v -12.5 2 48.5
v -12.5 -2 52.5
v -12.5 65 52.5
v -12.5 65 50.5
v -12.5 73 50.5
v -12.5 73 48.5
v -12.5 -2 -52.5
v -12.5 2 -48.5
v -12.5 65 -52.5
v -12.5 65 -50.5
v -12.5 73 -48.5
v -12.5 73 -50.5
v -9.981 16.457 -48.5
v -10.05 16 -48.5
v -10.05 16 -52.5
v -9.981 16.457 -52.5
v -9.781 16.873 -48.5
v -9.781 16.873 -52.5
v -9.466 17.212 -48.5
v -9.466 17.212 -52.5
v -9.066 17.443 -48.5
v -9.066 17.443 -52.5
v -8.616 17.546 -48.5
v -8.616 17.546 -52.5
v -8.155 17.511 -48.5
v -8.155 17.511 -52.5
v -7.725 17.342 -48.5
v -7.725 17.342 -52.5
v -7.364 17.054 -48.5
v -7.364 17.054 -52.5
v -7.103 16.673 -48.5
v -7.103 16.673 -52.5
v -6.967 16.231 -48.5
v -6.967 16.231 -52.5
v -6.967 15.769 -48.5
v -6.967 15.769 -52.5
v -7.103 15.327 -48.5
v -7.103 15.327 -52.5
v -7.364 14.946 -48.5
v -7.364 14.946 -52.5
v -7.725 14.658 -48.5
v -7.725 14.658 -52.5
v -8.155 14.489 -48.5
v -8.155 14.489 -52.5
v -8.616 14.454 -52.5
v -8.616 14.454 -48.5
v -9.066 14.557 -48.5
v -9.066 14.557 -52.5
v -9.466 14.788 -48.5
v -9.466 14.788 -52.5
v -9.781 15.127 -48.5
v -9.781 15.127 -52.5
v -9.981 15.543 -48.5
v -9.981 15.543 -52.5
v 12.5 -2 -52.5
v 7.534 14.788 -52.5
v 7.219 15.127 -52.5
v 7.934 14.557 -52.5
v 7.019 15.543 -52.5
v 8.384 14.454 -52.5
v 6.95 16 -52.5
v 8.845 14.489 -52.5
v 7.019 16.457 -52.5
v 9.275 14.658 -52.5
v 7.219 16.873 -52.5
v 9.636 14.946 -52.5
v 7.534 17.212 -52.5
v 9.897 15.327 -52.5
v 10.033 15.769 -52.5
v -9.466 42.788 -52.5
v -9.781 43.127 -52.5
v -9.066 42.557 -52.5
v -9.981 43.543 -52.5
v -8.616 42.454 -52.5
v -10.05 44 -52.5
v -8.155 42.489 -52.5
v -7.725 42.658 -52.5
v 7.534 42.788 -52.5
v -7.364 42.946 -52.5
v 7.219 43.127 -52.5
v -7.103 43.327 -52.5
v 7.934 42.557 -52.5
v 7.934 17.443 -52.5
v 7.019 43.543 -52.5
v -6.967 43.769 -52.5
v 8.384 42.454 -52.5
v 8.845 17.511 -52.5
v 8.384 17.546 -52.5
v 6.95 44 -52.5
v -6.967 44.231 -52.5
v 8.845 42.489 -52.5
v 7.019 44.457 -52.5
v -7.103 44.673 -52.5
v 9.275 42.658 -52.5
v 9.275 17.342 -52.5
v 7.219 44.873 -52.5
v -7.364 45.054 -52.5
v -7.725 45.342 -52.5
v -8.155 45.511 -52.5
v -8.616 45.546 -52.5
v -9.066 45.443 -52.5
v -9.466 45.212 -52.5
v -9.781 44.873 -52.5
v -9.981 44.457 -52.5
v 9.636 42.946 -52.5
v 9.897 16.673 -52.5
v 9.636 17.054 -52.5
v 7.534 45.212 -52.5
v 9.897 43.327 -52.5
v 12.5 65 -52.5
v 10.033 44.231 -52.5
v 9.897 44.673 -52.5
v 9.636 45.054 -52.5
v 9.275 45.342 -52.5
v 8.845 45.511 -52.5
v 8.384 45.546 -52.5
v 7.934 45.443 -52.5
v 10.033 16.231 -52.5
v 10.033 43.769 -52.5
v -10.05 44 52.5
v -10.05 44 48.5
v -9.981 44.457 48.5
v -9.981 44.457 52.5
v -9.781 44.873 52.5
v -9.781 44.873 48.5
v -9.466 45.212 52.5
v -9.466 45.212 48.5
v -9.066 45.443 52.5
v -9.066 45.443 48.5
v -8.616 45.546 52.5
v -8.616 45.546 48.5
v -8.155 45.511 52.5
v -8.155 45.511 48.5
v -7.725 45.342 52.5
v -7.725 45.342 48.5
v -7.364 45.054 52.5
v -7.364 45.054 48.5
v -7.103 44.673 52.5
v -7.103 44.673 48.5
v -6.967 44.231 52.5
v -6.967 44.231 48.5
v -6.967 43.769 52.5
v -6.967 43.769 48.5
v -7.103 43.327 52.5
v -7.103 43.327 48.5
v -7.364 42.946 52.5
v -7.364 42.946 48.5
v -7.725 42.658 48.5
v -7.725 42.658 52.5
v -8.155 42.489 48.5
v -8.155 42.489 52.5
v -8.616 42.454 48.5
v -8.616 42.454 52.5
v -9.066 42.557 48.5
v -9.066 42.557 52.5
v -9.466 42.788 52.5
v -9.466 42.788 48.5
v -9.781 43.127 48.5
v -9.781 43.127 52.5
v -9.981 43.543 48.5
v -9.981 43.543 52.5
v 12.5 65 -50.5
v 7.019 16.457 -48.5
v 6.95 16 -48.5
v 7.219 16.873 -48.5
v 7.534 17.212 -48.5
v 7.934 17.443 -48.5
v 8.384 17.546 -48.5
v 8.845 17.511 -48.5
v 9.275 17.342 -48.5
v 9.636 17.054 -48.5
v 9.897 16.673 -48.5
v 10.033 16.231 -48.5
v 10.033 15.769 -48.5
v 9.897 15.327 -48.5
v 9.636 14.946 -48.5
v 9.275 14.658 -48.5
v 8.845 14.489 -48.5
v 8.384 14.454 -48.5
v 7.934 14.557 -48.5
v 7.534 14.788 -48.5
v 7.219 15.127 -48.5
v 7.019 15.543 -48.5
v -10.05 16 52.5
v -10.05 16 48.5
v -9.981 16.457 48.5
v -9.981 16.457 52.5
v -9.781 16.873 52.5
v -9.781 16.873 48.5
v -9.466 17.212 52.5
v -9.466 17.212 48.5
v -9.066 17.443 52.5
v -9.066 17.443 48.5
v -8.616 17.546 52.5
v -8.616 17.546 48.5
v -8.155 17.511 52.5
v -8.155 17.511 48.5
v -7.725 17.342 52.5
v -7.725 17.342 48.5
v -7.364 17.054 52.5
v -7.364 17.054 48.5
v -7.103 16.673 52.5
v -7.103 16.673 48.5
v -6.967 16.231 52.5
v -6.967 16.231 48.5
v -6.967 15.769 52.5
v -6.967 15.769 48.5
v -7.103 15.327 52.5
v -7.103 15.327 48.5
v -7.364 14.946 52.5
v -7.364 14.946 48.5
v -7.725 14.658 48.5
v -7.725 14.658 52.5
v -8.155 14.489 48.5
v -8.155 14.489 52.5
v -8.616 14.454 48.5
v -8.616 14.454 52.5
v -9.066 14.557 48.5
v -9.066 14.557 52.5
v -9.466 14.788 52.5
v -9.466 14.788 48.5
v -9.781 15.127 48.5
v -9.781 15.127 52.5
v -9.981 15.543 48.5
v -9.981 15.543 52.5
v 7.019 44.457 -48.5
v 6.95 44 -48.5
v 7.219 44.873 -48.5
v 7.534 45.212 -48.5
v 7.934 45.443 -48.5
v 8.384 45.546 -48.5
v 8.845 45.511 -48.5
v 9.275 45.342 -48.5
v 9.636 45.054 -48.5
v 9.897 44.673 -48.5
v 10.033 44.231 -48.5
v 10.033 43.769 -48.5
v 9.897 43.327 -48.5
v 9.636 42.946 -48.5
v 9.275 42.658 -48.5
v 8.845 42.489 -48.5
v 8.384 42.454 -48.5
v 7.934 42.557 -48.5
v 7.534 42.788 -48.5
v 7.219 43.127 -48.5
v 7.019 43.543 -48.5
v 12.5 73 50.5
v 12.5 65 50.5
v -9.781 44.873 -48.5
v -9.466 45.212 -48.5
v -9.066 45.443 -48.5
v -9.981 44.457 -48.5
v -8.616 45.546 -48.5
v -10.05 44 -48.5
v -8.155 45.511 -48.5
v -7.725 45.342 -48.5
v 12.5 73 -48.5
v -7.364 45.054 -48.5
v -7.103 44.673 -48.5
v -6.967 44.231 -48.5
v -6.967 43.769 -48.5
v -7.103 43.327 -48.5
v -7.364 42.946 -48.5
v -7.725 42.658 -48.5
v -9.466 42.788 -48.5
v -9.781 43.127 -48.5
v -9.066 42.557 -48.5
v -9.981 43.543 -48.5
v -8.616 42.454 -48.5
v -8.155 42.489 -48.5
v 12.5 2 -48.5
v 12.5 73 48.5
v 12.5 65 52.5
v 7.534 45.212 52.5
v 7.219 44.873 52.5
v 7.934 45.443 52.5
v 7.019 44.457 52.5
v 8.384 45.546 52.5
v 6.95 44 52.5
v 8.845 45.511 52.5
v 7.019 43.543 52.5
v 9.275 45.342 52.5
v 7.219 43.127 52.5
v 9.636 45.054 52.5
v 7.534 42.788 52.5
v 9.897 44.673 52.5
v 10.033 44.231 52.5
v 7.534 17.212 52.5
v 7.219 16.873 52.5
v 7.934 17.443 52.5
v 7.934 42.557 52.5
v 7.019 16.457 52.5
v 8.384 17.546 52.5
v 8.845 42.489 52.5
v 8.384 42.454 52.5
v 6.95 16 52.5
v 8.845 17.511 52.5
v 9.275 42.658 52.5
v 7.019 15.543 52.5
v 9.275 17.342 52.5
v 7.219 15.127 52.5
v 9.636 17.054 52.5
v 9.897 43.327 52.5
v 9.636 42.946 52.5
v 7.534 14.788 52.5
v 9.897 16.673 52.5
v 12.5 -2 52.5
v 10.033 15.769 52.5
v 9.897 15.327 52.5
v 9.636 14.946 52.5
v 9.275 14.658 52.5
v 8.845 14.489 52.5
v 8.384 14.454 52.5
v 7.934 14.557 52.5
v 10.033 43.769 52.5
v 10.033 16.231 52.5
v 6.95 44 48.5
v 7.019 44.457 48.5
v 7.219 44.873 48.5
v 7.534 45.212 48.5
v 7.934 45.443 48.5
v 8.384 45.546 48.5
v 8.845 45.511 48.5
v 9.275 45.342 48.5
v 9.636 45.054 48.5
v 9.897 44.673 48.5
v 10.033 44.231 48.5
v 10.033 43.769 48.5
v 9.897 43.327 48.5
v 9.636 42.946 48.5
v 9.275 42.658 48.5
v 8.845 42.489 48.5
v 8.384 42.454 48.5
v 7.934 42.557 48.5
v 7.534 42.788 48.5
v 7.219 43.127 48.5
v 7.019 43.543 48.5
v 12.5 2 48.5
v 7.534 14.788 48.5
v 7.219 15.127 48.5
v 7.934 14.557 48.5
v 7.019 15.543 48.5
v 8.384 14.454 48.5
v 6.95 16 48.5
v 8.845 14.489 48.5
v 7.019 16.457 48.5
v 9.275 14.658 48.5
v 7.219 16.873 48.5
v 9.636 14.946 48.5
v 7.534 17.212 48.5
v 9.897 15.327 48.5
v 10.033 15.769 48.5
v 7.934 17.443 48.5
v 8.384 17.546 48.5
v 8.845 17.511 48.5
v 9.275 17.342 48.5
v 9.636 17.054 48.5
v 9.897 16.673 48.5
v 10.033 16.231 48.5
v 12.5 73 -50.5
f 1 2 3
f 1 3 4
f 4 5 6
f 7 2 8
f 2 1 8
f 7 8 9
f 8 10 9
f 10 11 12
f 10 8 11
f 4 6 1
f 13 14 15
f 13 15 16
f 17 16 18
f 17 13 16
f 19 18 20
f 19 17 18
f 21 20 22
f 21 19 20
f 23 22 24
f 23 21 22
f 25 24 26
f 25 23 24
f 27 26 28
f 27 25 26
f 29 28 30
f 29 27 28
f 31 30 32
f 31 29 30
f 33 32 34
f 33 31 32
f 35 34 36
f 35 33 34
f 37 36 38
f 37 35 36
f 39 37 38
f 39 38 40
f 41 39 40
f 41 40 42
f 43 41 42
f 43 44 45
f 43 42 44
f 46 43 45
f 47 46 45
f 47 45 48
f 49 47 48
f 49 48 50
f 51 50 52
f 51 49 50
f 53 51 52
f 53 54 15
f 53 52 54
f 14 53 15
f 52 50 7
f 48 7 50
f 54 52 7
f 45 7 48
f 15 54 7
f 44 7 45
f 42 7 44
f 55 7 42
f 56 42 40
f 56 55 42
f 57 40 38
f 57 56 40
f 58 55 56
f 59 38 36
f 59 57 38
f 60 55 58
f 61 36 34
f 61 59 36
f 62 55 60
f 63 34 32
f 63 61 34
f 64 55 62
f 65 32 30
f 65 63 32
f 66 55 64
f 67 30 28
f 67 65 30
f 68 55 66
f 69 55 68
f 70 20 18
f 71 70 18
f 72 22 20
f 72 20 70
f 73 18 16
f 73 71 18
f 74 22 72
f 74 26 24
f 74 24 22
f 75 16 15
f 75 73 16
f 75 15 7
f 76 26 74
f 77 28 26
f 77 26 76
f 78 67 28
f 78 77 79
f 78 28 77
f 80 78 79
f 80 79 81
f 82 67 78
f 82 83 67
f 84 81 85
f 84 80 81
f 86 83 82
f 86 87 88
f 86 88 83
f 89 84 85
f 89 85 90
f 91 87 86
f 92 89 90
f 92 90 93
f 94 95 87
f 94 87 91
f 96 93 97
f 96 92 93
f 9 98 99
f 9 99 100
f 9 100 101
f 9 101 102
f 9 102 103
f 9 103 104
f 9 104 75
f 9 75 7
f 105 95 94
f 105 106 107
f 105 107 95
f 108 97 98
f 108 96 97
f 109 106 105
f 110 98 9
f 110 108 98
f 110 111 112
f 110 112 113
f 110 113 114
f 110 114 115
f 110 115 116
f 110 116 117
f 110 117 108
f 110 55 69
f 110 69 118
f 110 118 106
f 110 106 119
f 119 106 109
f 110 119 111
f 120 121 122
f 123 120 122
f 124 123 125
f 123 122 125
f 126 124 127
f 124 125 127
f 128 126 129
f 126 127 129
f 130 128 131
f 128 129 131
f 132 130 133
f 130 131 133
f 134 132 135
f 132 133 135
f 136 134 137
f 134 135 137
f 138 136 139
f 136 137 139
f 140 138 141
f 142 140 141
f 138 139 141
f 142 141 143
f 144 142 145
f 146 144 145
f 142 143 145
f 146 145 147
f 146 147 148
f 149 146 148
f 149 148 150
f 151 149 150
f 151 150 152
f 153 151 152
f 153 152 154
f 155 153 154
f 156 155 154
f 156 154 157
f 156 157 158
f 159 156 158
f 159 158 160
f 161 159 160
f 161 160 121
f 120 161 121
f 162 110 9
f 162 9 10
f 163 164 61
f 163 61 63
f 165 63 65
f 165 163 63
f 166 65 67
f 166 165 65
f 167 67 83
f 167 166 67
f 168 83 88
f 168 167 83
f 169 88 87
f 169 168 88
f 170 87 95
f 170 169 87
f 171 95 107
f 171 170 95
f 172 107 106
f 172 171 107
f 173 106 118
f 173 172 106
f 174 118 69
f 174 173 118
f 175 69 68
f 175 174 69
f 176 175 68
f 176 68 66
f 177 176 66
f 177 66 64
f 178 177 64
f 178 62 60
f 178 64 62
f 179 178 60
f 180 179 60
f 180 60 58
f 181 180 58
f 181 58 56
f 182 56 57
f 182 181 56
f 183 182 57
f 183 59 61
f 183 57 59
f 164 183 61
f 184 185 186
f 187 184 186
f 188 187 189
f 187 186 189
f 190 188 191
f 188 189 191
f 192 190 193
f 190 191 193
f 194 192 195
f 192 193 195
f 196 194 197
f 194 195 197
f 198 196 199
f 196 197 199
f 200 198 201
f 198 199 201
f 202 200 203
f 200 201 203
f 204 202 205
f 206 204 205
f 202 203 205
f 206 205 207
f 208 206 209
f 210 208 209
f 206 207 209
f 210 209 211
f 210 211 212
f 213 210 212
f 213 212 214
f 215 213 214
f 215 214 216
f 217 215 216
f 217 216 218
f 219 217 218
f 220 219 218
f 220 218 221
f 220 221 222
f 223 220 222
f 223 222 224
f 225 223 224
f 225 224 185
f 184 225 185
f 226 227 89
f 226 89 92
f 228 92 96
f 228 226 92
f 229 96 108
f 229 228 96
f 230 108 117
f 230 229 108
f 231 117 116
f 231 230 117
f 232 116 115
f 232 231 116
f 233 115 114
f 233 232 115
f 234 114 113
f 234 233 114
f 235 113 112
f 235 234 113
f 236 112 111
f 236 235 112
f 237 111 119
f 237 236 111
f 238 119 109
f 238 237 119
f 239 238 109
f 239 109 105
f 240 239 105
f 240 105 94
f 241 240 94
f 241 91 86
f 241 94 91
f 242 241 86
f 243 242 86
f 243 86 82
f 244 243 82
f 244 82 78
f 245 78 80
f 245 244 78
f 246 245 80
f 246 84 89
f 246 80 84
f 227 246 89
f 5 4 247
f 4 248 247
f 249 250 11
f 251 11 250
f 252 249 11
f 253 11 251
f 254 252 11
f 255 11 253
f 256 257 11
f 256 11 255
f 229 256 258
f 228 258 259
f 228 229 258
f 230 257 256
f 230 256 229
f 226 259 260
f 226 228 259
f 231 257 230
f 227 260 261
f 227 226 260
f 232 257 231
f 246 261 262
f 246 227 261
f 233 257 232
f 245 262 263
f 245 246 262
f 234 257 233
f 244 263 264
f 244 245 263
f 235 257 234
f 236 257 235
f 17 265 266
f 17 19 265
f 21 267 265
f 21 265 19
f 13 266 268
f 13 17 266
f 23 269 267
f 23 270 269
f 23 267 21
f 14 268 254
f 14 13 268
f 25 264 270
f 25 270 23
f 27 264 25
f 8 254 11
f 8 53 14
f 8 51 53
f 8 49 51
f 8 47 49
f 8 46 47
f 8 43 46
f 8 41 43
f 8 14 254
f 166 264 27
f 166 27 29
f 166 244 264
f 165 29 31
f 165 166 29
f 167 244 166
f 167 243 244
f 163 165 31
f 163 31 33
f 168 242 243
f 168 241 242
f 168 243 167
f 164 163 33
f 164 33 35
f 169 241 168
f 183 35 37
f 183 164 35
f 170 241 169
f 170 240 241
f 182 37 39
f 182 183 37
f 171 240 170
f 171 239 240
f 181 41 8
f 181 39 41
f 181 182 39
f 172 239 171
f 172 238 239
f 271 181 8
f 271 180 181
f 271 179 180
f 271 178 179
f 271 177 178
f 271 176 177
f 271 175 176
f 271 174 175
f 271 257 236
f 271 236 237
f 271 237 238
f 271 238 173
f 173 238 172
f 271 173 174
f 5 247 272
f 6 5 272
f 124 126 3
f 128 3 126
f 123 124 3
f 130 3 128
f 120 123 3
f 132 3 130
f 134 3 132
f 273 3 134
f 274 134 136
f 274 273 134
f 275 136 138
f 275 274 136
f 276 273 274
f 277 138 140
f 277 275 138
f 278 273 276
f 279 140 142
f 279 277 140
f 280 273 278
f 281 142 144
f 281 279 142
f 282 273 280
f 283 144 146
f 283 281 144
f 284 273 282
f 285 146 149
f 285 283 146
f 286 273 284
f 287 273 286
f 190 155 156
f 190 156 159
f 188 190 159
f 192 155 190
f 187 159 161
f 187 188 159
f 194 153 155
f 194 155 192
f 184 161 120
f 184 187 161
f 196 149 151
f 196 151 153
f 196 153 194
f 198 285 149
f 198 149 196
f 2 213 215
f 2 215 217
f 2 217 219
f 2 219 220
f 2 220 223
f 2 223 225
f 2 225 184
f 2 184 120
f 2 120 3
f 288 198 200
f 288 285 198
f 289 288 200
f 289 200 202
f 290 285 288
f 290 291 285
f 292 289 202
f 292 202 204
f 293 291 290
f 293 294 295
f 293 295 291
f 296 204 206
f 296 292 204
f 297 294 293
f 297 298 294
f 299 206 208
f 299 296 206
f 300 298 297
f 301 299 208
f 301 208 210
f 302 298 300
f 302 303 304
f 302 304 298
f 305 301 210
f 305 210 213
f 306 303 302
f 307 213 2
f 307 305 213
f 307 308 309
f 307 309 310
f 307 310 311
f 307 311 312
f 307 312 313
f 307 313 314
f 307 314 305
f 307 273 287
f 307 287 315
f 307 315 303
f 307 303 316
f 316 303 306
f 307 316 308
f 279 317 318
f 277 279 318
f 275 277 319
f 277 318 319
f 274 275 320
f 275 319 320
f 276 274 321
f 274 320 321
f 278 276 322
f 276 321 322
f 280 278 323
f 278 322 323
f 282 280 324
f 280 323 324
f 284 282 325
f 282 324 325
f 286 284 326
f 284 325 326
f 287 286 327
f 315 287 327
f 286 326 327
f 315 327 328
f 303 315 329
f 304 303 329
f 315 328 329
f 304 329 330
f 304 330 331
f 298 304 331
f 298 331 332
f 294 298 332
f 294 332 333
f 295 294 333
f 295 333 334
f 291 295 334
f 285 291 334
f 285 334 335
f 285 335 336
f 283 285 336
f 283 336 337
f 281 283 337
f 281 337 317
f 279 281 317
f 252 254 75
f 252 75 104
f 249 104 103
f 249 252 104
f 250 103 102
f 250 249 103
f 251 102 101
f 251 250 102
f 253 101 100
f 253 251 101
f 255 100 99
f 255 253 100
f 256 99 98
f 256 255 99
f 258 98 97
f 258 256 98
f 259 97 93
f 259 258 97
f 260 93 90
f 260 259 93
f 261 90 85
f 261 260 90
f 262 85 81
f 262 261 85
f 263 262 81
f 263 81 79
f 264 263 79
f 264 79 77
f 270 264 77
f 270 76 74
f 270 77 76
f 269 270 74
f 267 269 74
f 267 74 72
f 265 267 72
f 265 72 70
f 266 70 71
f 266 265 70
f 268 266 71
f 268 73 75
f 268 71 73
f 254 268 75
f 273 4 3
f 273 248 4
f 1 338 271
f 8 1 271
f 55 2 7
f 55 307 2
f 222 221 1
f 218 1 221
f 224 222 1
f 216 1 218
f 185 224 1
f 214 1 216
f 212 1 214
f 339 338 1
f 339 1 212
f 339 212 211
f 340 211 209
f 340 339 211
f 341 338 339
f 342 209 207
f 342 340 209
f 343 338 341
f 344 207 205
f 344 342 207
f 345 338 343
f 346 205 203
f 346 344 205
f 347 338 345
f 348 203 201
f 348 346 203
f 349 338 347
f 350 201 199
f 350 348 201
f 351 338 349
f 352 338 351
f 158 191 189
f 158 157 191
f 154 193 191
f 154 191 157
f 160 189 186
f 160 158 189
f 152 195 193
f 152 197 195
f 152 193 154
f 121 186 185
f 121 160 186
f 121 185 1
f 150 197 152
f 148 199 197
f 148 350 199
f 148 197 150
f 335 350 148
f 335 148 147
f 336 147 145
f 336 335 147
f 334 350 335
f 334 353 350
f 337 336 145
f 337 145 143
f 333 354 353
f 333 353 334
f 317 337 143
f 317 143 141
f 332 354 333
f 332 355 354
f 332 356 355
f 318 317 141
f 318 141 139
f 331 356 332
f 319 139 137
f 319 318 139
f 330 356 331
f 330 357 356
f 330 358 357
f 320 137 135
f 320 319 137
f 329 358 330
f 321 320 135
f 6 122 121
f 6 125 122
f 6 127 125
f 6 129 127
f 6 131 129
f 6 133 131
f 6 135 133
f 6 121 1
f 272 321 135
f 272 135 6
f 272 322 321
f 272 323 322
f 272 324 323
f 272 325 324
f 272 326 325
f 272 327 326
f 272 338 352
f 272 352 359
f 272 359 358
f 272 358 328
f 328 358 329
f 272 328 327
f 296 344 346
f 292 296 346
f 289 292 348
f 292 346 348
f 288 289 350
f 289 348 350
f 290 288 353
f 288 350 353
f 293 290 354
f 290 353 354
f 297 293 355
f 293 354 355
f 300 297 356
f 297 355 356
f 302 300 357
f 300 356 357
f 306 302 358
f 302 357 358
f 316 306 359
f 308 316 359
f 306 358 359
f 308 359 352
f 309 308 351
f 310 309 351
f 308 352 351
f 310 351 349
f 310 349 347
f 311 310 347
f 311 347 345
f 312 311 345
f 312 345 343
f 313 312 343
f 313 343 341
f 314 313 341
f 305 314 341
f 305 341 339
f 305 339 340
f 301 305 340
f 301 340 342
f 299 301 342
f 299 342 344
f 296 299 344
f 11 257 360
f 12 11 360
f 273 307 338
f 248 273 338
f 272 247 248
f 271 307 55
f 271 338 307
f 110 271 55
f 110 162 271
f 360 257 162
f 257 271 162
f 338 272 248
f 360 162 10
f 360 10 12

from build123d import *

# Parameters (mm, degrees)
SKETCH1_W               = 105
SKETCH1_H               = 4
SKETCH1_W_2             = 2
SKETCH1_H_2             = 8
BOSS_EXTRUDE1_DEPTH     = 12.5
SKETCH2_R               = 1.55
CUT_EXTRUDE2_DEPTH      = 102
CUT_EXTRUDE2_DEPTH_BACK = 5


with BuildPart() as part:
    # Sketch1 → Boss-Extrude1 (new body, symmetric)
    with BuildSketch(Plane(origin=(0, 0, 0), x_dir=(0, 0, -1), z_dir=(1, 0, 0))):
        Rectangle(SKETCH1_W, SKETCH1_H)
        Polygon((-52.5, 65), (-52.5, 2), (-48.5, 2), (-48.5, 65), (-50.5, 65), align=None)
        Polygon((48.5, 65), (48.5, 2), (52.5, 2), (52.5, 65), (50.5, 65), align=None)
        with Locations((-49.5, 69)):
            Rectangle(SKETCH1_W_2, SKETCH1_H_2)
        with Locations((49.5, 69)):
            Rectangle(SKETCH1_W_2, SKETCH1_H_2)
    extrude(amount=BOSS_EXTRUDE1_DEPTH, both=True)

    # Sketch2 → Cut-Extrude2 (cut, two sides)
    with BuildSketch(Plane(origin=(0, 0, 48.5), x_dir=(-1, 0, 0), z_dir=(0, 0, -1))) as cut_extrude2_sk:
        with Locations((-8.5, 16)):
            Circle(SKETCH2_R)
        with Locations((-8.5, 44)):
            Circle(SKETCH2_R)
        with Locations((8.5, 16)):
            Circle(SKETCH2_R)
        with Locations((8.5, 44)):
            Circle(SKETCH2_R)
    extrude(amount=CUT_EXTRUDE2_DEPTH, mode=Mode.SUBTRACT)
    extrude(cut_extrude2_sk.sketch, amount=-CUT_EXTRUDE2_DEPTH_BACK, mode=Mode.SUBTRACT)


solid = part.part
